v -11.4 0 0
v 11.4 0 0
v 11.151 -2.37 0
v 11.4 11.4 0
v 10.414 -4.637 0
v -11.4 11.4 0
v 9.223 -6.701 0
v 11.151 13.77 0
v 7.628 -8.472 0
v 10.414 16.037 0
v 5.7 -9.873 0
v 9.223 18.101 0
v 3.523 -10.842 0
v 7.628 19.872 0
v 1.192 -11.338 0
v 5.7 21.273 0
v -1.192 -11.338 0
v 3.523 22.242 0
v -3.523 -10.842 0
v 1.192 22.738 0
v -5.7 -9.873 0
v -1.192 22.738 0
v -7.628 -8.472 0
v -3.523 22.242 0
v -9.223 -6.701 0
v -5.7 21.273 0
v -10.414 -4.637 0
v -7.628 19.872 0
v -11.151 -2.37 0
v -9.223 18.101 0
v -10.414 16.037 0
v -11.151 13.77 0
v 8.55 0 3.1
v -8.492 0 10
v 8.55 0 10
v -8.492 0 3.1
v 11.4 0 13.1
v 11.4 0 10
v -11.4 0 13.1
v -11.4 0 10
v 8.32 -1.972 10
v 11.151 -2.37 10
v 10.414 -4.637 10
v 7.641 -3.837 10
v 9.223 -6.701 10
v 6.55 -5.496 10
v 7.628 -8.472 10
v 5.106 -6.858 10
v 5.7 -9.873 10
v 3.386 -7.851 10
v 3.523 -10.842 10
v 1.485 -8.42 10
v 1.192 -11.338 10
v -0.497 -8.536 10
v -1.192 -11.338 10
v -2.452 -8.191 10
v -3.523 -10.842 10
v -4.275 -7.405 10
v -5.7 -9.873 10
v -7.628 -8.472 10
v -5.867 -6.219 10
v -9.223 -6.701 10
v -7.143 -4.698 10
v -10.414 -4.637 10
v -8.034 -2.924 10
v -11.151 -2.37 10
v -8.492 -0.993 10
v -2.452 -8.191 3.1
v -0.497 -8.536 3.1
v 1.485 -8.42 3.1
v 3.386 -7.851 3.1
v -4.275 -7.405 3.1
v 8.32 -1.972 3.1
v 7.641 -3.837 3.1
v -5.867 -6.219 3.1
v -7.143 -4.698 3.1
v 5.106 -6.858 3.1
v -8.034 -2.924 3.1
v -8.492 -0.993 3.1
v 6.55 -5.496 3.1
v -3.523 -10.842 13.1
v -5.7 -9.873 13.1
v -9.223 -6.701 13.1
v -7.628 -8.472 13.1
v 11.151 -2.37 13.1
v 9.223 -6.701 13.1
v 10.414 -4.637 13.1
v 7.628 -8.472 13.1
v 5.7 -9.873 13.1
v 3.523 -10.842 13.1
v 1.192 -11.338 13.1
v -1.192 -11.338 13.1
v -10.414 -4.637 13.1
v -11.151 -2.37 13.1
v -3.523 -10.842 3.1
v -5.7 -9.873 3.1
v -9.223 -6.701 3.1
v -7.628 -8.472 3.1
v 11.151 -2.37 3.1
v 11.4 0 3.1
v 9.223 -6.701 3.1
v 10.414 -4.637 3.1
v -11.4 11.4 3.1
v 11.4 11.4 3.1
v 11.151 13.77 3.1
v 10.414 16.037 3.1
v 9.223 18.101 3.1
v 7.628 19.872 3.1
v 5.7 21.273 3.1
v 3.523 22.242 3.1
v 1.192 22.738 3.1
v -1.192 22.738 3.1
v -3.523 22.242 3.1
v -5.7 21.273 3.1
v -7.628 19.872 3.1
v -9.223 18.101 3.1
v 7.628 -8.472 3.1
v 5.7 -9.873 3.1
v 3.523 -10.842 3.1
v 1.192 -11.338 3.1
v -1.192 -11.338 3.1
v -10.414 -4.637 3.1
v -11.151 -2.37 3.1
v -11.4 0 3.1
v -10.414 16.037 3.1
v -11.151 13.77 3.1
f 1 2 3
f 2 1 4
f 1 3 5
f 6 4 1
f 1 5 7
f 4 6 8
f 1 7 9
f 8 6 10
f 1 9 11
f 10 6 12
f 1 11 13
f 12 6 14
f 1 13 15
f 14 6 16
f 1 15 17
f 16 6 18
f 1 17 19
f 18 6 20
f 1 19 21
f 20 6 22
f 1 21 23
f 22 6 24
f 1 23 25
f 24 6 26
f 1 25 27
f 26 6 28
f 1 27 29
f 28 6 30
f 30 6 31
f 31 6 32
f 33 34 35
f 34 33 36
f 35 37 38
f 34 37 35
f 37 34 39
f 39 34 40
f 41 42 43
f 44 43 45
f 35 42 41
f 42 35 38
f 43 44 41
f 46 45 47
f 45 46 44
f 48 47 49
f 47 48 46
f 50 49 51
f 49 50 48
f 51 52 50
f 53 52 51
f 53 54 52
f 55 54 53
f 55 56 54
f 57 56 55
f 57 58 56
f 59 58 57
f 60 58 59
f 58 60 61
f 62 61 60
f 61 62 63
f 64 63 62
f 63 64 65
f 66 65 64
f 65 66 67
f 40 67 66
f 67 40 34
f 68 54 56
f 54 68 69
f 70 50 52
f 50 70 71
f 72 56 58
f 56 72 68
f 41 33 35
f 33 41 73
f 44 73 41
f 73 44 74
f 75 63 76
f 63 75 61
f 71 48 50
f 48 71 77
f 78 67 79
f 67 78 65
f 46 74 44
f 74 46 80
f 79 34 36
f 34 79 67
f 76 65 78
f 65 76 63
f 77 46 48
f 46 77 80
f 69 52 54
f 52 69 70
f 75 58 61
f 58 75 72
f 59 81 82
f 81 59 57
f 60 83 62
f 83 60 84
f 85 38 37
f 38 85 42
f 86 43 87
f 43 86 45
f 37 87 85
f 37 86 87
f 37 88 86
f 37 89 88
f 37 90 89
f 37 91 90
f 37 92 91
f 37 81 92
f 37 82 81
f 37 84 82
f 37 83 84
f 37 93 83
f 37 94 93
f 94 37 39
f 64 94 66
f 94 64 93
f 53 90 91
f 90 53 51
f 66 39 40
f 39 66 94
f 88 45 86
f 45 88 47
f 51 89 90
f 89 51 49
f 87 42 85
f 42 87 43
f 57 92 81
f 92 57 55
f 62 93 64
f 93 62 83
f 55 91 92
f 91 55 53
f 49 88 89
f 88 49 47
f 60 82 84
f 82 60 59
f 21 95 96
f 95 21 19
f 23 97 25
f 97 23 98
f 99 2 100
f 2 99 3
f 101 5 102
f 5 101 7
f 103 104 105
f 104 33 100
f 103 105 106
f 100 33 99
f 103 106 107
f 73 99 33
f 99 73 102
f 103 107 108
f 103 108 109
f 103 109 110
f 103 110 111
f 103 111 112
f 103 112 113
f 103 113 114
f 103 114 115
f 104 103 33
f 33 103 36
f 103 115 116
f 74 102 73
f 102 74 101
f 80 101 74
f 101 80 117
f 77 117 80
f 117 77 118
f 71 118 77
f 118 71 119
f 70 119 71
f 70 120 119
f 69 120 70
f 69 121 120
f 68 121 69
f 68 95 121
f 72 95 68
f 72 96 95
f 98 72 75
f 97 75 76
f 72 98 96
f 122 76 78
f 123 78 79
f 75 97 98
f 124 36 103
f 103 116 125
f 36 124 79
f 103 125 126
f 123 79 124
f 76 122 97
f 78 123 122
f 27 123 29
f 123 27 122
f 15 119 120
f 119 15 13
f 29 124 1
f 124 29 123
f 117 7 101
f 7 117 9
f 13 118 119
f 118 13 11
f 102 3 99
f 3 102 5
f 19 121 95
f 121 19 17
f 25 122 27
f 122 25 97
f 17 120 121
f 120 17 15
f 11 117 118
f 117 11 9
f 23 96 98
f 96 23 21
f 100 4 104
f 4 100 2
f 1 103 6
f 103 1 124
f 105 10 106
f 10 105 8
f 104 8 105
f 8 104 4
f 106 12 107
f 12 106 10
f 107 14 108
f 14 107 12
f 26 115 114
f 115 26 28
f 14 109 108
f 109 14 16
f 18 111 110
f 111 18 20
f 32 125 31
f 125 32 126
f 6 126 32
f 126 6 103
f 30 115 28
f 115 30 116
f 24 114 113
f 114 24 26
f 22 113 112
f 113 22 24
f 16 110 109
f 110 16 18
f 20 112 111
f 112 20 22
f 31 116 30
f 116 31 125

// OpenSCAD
head_inner_radius=11.4;
head_outer_radius=20.5;
head_thickness=3.1;
head_space=10;

module scale_obj() {
    union() {
        translate([0,0,head_thickness]) difference() {
            cylinder(head_thickness,head_outer_radius,head_outer_radius);
            cylinder(head_thickness,head_inner_radius,head_inner_radius);
        }
        translate([-head_outer_radius,0,0]) cube([2*head_outer_radius,4*head_outer_radius,head_thickness]);
    }
    
}

module head() {
    cylinder(head_space+head_thickness,head_inner_radius,head_inner_radius);
}


module ring() {
    difference() {
        cylinder(head_space,head_outer_radius,head_outer_radius);
        cylinder(head_space,0.75*head_inner_radius,0.75*head_inner_radius);
    }
}

module support() {
    union() {
        cylinder(head_thickness,head_inner_radius,head_inner_radius);
        translate([-head_inner_radius,0,0]) cube([2*head_inner_radius,head_inner_radius,head_thickness]);
        translate([0,head_inner_radius,0]) cylinder(head_thickness,head_inner_radius,head_inner_radius);
    }
}

module hook() {
    difference() {
        head();
        scale([1.05,1.05,10]) scale_obj();
        ring(); 
    }
}

module final() {
    union() {
        hook();
        support();
    }
}

final();
